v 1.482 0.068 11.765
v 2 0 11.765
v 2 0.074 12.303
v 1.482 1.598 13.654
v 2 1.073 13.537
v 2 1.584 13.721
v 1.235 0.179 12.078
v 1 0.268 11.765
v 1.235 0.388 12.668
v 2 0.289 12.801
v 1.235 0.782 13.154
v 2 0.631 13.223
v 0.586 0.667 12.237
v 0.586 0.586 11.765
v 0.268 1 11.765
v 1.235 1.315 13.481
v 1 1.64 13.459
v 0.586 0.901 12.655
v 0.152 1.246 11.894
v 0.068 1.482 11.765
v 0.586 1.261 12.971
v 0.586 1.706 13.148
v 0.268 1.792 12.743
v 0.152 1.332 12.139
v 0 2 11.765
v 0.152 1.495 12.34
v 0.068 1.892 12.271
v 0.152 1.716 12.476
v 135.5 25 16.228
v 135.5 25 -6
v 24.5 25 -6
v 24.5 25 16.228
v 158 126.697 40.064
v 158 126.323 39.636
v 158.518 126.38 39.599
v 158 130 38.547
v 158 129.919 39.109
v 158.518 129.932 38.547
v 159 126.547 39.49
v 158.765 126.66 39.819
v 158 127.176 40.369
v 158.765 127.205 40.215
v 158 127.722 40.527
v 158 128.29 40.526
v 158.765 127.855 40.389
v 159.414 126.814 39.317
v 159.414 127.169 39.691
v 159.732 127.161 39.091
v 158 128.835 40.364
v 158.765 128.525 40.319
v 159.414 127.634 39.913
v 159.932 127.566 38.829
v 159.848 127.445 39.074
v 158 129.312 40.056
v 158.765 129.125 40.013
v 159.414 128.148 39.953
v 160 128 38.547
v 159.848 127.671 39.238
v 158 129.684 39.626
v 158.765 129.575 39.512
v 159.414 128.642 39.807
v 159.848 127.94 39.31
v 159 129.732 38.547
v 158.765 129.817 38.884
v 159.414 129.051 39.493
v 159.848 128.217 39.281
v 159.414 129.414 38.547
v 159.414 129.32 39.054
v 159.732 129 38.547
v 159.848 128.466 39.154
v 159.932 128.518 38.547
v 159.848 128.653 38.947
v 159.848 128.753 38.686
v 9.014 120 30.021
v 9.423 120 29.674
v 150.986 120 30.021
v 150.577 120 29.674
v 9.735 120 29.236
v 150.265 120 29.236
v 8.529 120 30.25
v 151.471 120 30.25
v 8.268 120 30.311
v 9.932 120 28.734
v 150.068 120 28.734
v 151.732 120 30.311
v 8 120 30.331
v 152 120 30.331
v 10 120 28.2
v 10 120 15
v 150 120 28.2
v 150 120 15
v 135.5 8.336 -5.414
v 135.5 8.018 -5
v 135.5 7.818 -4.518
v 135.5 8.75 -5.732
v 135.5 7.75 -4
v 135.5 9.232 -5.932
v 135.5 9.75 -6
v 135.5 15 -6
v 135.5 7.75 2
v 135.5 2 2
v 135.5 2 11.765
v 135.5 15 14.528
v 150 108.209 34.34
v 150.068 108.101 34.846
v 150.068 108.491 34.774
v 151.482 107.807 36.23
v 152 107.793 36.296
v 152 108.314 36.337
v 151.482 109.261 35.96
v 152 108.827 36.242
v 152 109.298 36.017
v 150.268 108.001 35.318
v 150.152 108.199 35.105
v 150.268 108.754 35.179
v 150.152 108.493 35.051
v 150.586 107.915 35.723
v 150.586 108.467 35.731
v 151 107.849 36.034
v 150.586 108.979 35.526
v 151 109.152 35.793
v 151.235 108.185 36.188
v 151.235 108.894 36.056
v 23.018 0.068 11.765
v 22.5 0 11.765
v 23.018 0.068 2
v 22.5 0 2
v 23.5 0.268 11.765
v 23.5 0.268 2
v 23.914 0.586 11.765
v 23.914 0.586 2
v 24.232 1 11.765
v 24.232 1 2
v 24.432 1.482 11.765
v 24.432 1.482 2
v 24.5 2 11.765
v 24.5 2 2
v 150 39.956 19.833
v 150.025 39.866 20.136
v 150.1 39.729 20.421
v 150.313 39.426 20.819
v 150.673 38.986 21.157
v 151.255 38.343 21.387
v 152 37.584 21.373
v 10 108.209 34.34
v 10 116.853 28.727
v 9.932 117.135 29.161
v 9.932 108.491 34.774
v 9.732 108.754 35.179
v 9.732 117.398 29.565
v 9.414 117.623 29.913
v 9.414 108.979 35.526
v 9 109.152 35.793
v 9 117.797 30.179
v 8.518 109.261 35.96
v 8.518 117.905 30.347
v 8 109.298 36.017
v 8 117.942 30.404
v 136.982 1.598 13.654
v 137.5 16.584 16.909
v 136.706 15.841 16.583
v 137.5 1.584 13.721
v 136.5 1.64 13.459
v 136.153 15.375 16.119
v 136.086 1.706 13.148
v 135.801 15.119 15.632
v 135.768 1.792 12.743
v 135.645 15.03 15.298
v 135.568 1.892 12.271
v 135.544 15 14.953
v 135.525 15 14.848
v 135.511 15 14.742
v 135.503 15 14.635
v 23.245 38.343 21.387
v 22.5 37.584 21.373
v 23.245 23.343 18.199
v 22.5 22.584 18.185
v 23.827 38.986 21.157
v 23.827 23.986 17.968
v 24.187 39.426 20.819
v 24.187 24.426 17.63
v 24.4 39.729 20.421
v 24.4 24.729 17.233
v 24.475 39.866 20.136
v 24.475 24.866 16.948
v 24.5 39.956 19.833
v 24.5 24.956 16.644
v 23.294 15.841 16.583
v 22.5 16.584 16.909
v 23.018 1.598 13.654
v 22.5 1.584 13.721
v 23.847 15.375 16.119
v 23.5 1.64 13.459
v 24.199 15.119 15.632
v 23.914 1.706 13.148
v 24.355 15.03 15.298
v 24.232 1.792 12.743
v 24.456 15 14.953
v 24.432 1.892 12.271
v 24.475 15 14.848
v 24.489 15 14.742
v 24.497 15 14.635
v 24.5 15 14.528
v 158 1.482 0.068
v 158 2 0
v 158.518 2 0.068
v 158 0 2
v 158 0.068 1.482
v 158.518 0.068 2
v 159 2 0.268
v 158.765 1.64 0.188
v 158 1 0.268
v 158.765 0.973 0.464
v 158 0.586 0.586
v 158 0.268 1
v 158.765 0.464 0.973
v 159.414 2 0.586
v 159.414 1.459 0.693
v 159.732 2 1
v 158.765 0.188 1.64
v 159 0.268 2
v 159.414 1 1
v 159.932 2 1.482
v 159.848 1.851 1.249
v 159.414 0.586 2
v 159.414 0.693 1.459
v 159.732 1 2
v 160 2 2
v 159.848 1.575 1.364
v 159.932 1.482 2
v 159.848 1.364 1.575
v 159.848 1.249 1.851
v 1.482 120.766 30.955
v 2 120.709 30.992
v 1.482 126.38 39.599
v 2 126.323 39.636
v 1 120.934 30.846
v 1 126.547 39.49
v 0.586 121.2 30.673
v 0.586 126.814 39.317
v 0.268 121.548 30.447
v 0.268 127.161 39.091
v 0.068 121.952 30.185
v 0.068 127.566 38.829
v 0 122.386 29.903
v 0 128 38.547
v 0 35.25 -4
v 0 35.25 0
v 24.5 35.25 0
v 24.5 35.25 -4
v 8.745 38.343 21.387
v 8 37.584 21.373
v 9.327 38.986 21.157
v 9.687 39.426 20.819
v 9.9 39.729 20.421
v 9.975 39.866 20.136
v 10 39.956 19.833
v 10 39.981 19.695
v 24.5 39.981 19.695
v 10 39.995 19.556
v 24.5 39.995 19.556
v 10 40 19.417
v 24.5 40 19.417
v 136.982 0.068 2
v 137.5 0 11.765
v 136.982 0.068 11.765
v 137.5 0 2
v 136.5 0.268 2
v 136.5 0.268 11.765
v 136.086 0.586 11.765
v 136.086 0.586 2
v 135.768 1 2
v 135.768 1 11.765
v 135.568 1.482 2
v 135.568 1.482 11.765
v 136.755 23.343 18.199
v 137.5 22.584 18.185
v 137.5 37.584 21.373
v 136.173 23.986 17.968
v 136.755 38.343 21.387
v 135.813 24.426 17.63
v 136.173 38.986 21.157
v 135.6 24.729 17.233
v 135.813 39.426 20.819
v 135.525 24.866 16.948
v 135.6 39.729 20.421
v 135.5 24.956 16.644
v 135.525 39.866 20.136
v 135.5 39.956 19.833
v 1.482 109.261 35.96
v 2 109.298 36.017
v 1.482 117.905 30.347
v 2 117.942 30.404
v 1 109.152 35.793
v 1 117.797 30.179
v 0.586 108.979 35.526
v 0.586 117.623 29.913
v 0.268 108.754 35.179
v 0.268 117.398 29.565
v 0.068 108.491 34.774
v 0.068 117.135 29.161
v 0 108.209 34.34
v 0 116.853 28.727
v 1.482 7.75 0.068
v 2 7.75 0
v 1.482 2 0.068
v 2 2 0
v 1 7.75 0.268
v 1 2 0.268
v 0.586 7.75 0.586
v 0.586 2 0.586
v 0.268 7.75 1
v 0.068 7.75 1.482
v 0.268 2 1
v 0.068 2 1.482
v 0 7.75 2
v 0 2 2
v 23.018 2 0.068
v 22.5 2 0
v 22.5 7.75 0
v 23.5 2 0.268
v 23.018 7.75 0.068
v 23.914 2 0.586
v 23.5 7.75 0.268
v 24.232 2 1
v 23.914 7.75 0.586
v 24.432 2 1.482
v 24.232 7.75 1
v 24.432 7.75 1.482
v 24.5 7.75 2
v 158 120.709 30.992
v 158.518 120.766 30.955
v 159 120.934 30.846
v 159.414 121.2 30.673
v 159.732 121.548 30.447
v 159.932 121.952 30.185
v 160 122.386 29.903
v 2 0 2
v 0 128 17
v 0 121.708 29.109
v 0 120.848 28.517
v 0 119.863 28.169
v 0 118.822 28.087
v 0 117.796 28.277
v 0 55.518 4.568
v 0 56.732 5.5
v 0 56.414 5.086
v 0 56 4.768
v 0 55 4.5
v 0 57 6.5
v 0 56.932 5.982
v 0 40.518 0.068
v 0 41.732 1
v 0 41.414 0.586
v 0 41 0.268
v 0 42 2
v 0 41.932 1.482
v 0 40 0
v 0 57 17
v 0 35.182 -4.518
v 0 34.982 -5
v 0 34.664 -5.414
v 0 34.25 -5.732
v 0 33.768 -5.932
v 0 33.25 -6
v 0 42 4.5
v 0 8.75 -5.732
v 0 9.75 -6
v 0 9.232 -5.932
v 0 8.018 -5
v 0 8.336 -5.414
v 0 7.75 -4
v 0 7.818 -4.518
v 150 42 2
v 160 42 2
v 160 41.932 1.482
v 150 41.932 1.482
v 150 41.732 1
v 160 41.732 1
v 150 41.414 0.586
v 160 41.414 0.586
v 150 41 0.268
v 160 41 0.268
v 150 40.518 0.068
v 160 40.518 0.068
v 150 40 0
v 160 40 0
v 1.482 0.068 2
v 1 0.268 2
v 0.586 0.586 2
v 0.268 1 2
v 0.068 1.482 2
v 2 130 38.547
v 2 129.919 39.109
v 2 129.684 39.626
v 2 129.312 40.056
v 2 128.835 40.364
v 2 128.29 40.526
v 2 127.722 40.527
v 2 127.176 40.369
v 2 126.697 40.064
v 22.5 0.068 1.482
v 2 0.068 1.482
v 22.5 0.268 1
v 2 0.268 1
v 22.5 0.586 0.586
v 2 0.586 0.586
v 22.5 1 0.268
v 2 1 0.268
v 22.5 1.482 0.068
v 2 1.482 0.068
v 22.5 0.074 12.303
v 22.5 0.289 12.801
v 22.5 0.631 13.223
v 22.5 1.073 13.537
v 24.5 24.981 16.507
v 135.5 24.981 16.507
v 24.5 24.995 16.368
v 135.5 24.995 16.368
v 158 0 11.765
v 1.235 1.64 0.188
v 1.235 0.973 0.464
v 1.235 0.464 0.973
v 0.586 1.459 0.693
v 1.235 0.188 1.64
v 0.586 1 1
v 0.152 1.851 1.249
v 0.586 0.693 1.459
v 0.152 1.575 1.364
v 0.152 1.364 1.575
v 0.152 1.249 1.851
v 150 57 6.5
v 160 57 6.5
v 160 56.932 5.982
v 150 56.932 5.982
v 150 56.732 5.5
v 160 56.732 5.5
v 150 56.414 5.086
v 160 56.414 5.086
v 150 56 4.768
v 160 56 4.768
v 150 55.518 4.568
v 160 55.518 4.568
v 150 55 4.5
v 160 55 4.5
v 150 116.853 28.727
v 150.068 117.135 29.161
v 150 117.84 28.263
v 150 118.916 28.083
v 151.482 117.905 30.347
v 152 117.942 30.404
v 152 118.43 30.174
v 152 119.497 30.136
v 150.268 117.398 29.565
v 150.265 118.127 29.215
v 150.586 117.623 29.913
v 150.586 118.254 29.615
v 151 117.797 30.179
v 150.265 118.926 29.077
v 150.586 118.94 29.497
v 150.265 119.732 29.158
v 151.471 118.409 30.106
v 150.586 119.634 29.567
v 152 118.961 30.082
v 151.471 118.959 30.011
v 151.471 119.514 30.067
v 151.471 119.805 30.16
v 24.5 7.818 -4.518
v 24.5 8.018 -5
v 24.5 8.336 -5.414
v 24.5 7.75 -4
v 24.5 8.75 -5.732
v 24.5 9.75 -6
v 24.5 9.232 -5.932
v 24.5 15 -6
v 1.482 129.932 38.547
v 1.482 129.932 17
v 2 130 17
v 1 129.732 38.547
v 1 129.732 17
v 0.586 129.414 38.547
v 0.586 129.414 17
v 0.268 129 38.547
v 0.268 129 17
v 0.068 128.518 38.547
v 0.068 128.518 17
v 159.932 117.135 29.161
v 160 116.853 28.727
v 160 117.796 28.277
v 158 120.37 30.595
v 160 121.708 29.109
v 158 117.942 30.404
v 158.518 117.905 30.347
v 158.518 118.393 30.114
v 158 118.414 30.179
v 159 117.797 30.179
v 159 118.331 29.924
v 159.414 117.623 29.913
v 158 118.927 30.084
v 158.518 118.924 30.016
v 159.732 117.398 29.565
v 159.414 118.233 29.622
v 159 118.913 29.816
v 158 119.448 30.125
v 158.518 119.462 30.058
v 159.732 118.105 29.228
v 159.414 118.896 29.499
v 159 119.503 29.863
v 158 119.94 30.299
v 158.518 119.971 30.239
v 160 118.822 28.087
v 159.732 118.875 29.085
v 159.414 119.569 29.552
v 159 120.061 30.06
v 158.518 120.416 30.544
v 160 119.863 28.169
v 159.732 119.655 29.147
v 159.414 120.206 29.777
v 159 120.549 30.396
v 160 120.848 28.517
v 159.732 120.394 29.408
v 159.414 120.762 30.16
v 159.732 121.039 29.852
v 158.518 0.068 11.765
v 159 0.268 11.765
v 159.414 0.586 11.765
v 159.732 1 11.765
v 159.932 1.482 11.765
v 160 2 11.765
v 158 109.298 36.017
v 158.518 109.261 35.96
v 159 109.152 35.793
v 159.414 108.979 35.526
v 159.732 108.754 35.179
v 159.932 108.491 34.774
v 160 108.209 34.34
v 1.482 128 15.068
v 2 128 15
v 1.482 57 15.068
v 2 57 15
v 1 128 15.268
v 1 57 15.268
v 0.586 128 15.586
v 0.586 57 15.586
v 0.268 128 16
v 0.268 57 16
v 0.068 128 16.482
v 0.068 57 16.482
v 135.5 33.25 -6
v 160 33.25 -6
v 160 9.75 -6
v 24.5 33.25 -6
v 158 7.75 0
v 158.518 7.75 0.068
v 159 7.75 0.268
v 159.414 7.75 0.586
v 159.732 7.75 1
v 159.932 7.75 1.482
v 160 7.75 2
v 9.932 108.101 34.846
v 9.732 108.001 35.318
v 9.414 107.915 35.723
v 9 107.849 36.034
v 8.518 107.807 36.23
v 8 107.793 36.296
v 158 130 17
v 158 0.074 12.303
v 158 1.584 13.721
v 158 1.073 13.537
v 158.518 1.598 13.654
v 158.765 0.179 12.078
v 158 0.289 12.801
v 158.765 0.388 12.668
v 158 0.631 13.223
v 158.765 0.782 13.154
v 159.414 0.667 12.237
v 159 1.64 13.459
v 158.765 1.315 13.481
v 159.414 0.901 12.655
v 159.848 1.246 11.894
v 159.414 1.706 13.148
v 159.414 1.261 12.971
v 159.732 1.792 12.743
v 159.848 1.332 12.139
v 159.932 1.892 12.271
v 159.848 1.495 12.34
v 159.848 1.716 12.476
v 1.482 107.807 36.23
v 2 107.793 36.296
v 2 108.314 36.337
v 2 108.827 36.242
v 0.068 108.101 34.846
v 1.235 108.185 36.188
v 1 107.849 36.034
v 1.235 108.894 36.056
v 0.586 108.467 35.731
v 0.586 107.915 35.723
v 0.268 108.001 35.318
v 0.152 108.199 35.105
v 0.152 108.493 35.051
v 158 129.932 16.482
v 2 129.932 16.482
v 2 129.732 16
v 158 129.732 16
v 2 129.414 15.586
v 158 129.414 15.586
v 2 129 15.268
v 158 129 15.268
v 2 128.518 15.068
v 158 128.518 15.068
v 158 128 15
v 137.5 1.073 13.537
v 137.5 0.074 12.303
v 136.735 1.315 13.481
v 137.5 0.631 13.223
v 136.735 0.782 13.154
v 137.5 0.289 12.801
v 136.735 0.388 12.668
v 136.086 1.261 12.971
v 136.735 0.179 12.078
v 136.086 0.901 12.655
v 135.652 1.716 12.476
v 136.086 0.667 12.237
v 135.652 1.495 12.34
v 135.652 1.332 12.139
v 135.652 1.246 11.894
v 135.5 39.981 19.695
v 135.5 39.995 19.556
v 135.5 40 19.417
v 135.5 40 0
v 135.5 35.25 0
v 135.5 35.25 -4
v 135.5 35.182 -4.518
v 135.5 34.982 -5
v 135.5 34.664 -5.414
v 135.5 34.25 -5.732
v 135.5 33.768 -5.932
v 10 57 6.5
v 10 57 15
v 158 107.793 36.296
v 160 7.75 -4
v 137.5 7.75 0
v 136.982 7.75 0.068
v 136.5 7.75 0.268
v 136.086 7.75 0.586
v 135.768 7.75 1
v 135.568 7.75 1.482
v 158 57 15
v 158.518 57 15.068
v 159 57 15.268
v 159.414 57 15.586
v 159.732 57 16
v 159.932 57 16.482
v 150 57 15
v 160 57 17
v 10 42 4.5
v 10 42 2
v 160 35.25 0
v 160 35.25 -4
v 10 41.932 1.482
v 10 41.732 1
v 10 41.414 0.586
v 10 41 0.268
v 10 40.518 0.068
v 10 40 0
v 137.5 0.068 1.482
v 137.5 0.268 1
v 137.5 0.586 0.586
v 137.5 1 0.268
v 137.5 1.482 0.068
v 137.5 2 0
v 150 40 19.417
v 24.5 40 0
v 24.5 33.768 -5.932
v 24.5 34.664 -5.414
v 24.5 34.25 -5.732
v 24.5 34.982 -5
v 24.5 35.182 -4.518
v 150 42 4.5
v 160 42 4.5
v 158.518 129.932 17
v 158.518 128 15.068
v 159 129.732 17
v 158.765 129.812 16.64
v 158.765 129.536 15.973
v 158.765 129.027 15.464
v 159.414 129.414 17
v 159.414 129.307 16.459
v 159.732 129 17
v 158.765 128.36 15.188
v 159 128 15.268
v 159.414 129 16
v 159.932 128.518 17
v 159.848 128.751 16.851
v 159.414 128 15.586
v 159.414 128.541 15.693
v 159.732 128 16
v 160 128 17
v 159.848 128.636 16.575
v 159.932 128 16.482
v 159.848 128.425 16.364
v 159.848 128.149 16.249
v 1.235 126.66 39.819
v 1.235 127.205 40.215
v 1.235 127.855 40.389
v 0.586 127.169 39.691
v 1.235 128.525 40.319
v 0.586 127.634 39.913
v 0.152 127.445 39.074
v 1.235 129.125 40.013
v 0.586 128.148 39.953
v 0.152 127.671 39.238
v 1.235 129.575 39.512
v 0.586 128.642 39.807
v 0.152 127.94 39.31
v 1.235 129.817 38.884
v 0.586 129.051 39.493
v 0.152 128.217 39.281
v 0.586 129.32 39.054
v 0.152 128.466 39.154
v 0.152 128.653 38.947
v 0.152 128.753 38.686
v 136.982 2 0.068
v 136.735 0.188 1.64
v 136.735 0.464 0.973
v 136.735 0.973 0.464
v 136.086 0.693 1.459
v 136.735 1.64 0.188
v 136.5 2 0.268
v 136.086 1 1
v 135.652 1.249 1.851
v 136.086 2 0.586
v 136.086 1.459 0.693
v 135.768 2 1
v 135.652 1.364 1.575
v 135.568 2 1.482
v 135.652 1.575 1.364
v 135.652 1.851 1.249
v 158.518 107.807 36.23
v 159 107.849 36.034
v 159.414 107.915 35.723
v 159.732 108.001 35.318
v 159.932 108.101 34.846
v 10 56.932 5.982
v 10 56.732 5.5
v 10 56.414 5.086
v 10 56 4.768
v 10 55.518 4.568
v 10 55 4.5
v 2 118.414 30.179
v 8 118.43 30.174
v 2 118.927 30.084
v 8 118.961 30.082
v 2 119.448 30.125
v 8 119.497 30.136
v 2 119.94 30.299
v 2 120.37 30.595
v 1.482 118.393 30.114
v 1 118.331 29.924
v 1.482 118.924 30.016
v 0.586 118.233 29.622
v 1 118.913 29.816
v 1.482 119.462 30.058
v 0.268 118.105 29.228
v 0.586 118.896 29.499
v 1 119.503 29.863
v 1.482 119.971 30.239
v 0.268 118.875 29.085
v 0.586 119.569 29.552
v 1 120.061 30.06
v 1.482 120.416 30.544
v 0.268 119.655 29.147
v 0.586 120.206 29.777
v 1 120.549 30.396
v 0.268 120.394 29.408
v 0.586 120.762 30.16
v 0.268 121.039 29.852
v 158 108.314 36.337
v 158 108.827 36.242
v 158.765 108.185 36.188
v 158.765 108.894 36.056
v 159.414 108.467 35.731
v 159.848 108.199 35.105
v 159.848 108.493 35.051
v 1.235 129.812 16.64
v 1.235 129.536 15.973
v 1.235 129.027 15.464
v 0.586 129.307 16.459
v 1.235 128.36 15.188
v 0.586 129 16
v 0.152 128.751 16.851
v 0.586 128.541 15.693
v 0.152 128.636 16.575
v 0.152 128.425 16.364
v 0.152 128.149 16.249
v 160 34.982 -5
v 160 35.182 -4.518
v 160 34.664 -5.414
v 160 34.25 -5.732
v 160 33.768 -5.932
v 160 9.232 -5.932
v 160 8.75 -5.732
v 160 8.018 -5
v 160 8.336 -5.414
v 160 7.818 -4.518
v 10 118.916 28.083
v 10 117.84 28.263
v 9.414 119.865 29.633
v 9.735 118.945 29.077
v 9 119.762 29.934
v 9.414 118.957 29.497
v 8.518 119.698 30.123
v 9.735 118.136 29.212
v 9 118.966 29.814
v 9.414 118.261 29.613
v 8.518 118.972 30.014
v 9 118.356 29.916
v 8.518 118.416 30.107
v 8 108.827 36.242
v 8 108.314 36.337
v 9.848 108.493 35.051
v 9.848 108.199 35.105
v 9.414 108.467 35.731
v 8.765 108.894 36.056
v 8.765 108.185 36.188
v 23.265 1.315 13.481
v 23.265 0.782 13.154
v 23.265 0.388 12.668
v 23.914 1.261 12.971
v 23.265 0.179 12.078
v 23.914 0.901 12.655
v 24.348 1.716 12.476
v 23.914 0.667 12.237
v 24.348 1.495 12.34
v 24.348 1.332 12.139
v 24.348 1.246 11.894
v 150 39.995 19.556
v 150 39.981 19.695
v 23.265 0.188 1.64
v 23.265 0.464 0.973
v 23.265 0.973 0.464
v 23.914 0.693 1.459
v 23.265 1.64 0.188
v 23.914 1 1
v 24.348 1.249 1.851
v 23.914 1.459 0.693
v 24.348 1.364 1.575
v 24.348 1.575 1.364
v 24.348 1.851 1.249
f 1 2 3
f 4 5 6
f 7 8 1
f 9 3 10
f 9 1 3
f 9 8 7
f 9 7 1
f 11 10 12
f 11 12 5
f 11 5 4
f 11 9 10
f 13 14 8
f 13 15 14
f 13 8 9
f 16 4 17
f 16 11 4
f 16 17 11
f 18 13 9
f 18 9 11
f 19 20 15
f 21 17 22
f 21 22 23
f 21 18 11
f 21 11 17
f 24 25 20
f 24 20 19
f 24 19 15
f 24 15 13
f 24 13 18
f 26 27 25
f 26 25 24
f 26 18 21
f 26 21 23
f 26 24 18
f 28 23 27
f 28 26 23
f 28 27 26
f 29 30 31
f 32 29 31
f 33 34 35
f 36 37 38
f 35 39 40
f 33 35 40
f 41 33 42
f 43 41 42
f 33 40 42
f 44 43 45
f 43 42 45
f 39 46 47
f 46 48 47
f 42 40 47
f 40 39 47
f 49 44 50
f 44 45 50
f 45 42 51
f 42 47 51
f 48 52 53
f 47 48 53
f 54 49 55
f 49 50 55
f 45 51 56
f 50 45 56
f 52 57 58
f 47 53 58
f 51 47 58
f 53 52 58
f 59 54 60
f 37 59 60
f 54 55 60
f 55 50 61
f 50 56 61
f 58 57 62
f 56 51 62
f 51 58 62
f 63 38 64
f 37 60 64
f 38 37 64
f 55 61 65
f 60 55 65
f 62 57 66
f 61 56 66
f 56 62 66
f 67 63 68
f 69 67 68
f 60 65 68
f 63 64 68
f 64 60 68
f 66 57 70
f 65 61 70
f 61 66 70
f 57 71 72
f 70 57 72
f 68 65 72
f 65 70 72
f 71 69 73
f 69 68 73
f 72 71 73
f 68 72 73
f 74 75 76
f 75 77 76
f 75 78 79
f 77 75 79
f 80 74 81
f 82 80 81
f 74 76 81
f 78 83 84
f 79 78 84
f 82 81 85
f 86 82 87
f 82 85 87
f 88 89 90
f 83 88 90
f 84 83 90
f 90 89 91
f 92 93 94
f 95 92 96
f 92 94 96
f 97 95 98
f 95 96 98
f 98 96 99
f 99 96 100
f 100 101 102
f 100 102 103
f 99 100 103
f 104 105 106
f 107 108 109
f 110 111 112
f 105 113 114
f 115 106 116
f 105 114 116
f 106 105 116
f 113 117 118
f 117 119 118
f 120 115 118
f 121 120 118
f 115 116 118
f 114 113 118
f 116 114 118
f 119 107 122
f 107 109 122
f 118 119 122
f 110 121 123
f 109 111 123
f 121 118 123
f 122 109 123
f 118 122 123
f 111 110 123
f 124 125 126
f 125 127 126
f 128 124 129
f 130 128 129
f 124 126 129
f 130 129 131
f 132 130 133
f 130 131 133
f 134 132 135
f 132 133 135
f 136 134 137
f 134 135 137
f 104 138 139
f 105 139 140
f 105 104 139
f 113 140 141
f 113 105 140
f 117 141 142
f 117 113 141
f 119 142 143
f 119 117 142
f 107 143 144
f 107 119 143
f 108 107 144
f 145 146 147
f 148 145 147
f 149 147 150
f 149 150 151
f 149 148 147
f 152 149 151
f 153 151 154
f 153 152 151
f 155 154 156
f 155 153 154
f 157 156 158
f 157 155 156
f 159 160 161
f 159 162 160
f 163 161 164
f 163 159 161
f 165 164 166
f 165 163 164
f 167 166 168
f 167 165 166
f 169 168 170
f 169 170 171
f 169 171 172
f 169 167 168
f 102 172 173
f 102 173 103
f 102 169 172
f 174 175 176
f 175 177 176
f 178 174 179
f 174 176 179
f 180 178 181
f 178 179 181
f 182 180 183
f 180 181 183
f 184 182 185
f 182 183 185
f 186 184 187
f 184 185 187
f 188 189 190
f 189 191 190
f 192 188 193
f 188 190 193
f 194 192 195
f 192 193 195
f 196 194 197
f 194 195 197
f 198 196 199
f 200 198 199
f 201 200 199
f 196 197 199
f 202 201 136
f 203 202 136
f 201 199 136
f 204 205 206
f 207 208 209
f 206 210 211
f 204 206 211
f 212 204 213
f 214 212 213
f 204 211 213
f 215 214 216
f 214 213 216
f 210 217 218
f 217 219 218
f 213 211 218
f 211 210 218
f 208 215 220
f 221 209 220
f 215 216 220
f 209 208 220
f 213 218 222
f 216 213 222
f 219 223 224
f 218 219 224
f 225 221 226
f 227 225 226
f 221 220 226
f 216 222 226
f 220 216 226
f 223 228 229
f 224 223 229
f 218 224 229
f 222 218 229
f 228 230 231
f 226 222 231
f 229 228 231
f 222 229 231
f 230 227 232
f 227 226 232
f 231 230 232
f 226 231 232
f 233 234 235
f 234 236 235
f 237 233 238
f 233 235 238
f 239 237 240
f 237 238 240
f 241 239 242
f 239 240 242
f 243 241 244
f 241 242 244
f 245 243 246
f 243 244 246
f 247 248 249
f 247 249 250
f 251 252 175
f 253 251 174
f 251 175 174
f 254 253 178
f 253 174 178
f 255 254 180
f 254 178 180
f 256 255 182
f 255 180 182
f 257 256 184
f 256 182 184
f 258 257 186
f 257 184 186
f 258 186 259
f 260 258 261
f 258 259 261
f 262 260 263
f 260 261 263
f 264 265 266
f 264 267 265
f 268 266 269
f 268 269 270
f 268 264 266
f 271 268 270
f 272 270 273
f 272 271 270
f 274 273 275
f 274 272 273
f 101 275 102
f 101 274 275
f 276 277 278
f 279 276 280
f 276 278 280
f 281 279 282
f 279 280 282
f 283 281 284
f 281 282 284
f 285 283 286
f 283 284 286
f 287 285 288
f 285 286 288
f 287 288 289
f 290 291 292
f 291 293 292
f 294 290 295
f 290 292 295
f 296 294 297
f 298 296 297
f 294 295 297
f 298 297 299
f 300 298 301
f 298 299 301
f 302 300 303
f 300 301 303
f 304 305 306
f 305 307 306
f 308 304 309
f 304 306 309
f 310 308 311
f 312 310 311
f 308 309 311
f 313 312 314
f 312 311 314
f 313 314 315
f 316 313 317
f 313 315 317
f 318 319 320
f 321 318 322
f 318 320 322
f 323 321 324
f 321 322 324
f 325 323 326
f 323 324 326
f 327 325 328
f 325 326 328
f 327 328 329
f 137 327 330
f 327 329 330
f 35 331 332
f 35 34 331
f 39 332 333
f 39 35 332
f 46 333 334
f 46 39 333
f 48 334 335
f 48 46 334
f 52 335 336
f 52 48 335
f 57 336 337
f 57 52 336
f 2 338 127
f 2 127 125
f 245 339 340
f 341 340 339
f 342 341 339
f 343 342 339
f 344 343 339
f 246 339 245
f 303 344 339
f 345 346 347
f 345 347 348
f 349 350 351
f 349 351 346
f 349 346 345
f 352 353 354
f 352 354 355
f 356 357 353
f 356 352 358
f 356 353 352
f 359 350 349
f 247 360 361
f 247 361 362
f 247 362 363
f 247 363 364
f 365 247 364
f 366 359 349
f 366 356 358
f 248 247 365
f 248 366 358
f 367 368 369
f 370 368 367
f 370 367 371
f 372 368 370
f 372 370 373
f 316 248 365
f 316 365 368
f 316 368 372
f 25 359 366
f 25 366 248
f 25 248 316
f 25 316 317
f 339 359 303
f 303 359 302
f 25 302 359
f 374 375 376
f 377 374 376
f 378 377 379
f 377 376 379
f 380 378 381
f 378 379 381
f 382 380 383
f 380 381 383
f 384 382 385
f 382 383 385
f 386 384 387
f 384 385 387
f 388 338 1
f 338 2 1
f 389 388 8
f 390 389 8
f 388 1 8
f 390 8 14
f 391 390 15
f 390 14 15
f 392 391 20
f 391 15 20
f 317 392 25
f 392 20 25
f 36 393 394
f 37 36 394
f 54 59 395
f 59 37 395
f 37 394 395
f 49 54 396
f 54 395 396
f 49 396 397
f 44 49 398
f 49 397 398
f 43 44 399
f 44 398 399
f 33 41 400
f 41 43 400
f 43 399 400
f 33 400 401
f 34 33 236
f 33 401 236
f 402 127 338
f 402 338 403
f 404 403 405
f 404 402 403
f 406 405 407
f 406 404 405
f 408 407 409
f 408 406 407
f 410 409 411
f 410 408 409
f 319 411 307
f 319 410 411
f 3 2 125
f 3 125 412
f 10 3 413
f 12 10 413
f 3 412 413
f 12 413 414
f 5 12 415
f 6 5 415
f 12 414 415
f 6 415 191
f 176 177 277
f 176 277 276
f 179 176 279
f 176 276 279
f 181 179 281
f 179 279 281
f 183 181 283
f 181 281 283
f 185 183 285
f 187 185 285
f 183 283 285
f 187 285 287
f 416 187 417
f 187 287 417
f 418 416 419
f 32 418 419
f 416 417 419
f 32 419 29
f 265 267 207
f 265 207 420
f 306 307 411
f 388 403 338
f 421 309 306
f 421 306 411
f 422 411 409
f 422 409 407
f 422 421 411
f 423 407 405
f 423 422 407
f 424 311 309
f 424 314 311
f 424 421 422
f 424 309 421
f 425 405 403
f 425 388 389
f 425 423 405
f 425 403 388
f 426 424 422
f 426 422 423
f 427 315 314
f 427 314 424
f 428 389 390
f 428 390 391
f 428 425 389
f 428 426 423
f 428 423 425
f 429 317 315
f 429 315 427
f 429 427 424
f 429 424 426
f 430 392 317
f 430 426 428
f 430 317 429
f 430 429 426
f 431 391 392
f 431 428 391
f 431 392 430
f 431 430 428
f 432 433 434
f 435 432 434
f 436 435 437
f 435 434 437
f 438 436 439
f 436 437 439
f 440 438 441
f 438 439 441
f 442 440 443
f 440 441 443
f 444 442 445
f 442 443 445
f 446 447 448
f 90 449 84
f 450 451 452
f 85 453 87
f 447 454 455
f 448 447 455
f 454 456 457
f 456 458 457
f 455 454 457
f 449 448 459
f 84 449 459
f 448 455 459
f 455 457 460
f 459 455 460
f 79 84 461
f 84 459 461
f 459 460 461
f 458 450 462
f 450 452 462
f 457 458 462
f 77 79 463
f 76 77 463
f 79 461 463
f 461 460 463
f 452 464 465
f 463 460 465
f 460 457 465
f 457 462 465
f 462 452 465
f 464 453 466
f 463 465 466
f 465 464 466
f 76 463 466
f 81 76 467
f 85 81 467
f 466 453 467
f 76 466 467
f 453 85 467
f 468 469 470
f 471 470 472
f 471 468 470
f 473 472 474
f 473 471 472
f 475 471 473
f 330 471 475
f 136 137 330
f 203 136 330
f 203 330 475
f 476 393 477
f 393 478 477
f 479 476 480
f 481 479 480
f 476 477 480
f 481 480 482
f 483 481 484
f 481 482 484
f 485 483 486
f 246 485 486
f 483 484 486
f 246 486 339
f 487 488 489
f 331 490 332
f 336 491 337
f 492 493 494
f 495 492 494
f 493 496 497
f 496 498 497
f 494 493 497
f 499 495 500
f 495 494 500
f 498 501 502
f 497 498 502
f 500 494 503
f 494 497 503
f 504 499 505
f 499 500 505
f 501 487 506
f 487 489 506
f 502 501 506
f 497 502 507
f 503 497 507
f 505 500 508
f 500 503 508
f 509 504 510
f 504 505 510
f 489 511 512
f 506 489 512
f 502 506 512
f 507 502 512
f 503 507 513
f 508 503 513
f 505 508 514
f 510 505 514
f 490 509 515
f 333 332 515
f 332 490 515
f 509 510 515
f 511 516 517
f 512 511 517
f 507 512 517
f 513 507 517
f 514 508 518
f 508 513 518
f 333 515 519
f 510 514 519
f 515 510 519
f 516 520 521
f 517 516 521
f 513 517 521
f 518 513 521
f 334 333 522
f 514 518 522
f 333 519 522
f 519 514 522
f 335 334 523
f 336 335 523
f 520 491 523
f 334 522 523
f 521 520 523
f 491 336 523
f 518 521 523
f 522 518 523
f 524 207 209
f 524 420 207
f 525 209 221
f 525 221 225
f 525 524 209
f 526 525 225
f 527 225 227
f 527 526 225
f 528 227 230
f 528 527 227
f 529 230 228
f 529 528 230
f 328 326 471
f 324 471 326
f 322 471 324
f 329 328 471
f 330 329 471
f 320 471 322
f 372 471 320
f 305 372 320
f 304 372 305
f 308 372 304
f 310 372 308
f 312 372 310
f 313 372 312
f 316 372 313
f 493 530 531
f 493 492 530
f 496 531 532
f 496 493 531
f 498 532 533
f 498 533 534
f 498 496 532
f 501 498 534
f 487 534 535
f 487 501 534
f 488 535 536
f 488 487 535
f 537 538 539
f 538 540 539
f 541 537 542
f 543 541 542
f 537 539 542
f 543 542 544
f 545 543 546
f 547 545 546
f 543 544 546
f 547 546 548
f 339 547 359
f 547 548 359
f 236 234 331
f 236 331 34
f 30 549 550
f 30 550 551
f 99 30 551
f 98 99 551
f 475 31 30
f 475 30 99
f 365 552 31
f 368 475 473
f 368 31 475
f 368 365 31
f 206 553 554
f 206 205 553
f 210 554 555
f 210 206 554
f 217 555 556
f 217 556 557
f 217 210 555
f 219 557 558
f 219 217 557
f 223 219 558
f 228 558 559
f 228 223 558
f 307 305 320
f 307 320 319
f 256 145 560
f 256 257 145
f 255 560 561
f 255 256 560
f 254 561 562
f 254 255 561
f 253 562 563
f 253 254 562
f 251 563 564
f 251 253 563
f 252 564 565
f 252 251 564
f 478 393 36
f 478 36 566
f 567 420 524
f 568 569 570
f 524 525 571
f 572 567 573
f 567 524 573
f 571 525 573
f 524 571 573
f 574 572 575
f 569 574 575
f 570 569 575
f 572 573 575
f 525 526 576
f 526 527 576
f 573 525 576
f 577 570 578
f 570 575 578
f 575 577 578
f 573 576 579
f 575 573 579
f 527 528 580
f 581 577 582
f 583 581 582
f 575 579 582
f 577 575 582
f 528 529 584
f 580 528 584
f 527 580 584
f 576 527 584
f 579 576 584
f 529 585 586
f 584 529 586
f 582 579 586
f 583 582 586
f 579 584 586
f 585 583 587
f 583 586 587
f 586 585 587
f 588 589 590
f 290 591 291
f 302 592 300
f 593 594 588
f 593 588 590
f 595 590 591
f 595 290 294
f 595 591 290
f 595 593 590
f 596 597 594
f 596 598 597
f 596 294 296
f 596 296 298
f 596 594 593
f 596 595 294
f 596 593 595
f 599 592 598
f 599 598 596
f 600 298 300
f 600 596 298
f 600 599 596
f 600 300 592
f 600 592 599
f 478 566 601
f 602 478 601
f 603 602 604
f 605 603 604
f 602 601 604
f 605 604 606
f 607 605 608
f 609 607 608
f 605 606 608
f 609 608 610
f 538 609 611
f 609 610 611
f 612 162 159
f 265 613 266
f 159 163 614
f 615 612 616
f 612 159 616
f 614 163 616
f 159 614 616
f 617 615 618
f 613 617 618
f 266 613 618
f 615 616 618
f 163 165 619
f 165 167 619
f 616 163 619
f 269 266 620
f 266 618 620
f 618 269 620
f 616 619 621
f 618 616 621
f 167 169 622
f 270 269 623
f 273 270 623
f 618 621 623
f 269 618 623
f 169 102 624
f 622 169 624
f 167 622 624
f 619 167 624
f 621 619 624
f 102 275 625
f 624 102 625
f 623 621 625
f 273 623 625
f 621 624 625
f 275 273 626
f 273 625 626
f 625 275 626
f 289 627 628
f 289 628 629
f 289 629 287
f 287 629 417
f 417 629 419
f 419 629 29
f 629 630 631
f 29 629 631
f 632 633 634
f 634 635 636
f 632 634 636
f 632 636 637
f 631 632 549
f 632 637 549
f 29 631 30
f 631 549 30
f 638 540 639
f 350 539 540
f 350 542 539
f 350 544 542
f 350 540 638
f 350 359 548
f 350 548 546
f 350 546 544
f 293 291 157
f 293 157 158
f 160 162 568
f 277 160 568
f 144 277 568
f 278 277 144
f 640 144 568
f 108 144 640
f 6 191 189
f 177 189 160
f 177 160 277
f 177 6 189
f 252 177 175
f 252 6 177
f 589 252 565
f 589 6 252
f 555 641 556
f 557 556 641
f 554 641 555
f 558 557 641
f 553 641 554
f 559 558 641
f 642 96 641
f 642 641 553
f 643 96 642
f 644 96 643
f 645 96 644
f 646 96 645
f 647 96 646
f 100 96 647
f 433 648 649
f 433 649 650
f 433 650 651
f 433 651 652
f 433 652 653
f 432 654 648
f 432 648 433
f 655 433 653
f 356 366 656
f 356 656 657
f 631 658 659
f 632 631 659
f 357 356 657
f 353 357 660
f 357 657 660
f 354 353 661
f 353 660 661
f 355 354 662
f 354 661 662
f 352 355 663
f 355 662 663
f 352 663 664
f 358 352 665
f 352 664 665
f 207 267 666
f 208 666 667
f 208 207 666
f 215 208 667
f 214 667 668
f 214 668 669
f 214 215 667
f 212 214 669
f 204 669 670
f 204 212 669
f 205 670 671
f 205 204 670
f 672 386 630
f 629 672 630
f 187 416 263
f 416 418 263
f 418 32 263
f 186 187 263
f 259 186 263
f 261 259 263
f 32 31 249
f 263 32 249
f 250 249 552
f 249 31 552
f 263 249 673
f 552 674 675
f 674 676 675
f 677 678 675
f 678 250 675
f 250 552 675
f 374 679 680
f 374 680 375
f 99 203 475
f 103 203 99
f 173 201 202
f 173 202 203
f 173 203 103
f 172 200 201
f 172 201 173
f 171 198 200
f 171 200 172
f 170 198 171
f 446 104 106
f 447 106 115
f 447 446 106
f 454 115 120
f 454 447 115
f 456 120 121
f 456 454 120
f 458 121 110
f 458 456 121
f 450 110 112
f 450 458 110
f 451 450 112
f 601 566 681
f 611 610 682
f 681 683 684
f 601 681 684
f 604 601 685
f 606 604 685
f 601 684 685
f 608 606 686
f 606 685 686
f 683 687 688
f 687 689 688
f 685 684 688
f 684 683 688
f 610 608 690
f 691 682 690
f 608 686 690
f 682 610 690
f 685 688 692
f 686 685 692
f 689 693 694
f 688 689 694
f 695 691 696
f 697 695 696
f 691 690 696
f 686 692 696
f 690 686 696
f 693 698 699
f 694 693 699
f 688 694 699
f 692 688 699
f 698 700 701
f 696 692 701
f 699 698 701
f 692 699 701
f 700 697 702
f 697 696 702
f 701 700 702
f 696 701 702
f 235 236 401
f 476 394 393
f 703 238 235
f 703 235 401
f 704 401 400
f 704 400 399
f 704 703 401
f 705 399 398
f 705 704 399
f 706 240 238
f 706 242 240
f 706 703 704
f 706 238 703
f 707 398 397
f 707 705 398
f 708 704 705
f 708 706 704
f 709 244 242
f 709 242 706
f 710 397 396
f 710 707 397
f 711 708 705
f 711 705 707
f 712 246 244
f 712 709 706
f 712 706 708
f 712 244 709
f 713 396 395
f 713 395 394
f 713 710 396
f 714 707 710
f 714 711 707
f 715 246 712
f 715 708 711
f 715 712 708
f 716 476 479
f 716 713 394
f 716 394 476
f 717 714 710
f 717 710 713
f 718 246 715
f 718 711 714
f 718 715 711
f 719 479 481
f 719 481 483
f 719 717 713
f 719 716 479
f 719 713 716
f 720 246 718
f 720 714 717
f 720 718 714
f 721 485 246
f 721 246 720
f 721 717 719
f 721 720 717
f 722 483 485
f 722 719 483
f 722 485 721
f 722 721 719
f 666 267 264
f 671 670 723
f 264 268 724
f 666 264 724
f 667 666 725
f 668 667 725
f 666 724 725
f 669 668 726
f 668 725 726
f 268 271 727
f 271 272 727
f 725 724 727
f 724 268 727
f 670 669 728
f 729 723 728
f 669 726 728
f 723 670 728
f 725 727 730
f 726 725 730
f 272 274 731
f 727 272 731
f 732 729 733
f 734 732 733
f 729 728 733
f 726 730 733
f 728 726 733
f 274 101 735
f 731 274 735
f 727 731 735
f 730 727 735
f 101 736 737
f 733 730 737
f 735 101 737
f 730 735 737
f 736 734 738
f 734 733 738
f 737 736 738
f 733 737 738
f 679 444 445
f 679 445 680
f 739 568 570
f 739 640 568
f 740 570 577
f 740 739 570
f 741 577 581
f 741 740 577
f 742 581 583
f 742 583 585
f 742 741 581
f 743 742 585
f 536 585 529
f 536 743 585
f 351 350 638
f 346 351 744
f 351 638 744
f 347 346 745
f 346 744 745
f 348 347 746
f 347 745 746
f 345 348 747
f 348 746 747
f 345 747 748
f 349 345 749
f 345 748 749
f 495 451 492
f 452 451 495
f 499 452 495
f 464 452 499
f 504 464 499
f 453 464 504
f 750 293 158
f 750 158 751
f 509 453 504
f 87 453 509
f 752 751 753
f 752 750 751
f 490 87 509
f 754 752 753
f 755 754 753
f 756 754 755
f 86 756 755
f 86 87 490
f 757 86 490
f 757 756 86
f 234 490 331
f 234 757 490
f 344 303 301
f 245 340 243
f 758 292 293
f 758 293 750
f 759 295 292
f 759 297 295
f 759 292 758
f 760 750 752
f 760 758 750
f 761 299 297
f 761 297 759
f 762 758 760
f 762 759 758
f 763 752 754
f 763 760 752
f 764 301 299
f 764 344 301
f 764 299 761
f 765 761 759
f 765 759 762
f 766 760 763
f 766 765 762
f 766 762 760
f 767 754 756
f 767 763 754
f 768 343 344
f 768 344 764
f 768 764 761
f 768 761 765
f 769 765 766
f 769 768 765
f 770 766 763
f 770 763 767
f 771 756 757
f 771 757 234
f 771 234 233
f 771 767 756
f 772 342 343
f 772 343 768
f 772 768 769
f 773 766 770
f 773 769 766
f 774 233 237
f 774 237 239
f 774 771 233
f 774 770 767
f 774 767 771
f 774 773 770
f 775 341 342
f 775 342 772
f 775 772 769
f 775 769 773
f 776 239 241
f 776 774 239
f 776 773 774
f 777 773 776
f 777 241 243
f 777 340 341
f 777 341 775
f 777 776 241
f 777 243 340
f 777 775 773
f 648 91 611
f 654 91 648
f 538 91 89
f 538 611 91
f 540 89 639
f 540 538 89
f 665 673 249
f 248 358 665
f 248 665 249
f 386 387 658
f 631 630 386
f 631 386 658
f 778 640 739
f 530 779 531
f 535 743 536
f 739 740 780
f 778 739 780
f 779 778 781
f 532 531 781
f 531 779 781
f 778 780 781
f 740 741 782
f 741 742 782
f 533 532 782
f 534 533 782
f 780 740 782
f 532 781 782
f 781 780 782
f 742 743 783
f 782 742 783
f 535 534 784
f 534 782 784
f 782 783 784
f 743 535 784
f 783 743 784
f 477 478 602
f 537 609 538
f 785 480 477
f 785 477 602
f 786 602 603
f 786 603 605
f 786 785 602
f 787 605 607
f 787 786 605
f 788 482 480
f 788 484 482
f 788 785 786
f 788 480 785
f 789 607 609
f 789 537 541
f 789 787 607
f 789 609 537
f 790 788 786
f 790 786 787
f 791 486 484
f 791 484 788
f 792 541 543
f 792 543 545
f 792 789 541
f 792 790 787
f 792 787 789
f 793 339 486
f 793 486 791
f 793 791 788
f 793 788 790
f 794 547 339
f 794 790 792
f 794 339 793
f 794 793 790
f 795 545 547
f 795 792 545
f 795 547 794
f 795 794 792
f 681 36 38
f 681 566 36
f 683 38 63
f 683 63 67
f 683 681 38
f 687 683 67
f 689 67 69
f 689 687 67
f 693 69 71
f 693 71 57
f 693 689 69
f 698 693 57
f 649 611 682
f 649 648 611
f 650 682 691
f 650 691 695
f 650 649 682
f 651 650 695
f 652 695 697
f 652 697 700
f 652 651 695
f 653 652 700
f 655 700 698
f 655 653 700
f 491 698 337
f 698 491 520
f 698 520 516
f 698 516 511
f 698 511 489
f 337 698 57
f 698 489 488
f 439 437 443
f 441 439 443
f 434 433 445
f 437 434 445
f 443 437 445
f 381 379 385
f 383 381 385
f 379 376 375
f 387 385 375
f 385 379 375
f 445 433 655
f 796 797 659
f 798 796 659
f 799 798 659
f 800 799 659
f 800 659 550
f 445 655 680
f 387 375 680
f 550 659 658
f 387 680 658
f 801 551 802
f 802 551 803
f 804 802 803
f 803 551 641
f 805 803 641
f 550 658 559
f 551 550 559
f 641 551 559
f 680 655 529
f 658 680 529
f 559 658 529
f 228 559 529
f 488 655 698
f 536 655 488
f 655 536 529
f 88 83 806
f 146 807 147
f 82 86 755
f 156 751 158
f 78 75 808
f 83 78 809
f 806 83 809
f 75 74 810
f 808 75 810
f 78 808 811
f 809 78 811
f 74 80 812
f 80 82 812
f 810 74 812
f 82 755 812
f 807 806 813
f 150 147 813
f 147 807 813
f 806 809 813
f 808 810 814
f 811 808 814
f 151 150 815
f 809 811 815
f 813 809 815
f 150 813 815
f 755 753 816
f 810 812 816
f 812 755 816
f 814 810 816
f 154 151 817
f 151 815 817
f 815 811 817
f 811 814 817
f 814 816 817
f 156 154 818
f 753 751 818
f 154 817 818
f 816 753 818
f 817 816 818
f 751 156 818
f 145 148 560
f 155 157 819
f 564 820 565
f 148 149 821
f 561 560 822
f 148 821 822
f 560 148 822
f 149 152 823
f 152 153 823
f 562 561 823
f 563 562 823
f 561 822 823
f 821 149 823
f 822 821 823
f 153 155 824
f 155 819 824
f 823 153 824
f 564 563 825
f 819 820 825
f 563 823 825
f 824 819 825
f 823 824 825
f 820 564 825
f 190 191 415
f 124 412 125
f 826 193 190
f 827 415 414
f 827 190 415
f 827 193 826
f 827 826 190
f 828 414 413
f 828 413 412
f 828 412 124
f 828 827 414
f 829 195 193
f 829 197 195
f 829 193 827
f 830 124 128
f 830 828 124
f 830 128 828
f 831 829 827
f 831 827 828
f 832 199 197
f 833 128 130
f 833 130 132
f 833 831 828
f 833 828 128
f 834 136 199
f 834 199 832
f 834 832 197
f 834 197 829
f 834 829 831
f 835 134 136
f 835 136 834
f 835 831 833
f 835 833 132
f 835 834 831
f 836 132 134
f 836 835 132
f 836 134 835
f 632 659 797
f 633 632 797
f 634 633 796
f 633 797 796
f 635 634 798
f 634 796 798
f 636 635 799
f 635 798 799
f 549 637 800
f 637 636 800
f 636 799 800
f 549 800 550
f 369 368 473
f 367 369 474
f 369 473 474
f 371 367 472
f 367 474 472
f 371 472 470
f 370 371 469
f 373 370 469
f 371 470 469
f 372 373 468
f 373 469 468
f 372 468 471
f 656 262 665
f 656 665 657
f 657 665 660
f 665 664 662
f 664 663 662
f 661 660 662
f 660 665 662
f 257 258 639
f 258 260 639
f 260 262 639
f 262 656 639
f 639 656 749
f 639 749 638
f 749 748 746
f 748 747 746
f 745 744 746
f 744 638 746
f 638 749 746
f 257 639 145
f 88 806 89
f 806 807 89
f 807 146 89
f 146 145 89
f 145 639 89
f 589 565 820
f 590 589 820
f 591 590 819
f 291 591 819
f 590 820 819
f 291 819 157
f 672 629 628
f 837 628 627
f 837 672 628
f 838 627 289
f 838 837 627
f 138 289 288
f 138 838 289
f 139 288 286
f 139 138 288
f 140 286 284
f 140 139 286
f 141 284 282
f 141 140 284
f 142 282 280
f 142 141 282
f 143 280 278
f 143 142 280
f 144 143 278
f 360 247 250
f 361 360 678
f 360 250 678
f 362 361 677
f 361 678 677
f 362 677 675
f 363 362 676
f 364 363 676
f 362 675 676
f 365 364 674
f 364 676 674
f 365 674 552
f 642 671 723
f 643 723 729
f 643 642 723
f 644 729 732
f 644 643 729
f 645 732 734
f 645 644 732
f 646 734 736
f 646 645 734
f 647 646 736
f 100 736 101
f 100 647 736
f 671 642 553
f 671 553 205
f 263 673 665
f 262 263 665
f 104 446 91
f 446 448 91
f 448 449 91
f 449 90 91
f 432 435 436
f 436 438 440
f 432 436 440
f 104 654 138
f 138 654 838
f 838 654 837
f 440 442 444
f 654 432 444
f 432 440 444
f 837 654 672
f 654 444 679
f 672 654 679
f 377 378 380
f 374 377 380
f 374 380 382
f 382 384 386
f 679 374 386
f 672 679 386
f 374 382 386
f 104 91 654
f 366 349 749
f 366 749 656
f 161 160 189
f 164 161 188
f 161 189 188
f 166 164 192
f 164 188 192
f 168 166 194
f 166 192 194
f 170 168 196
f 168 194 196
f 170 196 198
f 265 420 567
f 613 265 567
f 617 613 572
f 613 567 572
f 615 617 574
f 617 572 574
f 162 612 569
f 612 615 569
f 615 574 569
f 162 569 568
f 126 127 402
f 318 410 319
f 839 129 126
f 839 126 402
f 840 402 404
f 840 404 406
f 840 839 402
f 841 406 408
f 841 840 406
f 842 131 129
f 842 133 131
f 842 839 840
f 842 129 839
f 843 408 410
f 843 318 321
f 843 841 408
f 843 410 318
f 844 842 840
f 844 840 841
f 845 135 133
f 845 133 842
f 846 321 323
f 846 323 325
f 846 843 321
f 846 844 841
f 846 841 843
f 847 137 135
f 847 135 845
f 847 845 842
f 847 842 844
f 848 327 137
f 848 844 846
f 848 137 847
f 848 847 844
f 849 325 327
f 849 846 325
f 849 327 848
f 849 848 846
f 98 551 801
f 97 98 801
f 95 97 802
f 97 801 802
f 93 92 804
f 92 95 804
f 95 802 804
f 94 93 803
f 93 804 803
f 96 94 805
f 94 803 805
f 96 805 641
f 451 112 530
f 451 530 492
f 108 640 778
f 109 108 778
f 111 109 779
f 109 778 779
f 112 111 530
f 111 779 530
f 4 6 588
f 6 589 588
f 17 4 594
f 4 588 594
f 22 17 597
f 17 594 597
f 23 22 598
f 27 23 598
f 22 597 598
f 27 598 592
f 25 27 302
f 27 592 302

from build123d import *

# Parameters (mm, degrees)
PAD_DEPTH         = 160
FILLET_R          = 2
SKETCH001_W       = 15
SKETCH001_H       = 111
POCKET_DEPTH      = 25.547835
POCKET_DEPTH_BACK = -21.001
FILLET001_R       = 2


with BuildPart() as part:
    # Sketch → Pad (new body)
    with BuildSketch(Plane.YZ):
        with BuildLine():
            Line((0, 0), (0, 13.384276))
            Line((0, 13.384276), (108.603536, 36.46867))
            Line((108.603536, 36.46867), (117.942463, 30.4039))
            ThreePointArc((117.942463, 30.4039), (119.447565, 30.124946), (120.709082, 30.991963))
            Line((120.709082, 30.991963), (126.322659, 39.636113))
            ThreePointArc((130, 38.546835), (128.568031, 40.464474), (126.322659, 39.636113))
            Line((130, 38.546835), (130, 15))
            Line((130, 15), (57, 15))
            Line((57, 15), (57, 4.5))
            Line((57, 4.5), (42, 4.5))
            Line((42, 4.5), (42, 0))
            Line((42, 0), (35.25, 0))
            Line((35.25, 0), (35.25, -6))
            Line((35.25, -6), (7.75, -6))
            Line((7.75, -6), (7.75, 0))
            Line((7.75, 0), (0, 0))
        make_face()
    extrude(amount=PAD_DEPTH)

    # Fillet
    fillet_edges = [part.edges().sort_by_distance(p)[0] for p in [
        (80, 42, 0),
        (80, 35.25, -6),
        (80, 0, 13.384276),
        (80, 108.603536, 36.46867),
        (80, 130, 38.546835),
        (80, 130, 15),
        (80, 0, 0),
        (80, 57, 4.5),
        (80, 7.75, -6),
    ]]
    fillet(fillet_edges, radius=FILLET_R)

    # Sketch001 (on Face2 of Pad) → Pocket (cut, two sides)
    with BuildSketch(Plane.YX.offset(-15)) as pocket_sk:
        Polygon((25, 135.5), (25, 24.5), (40, 24.5), (40, 10), (120, 10), (120, 150), (40, 150), (40, 135.5), align=None)
        with Locations((7.5, 80)):
            Rectangle(SKETCH001_W, SKETCH001_H)
    extrude(amount=-POCKET_DEPTH, mode=Mode.SUBTRACT)
    extrude(pocket_sk.sketch, amount=-POCKET_DEPTH_BACK, mode=Mode.SUBTRACT)

    # Fillet001
    fillet001_edges = [part.edges().sort_by_distance(p)[0] for p in [
        (0, 54.688694, 25.008717),
        (160, 54.688694, 25.008717),
        (150, 73.896606, 29.091484),
        (10, 73.896606, 29.091484),
        (80, 25, 18.69819),
        (80, 15, 16.572624),
        (24.5, 0, 6.882354),
        (135.5, 0, 6.882354),
        (24.5, 32.5, 20.292364),
        (135.5, 32.5, 20.292364),
        (142.75, 40, 21.886538),
        (17.25, 40, 21.886538),
    ]]
    fillet(fillet001_edges, radius=FILLET001_R)


solid = part.part
